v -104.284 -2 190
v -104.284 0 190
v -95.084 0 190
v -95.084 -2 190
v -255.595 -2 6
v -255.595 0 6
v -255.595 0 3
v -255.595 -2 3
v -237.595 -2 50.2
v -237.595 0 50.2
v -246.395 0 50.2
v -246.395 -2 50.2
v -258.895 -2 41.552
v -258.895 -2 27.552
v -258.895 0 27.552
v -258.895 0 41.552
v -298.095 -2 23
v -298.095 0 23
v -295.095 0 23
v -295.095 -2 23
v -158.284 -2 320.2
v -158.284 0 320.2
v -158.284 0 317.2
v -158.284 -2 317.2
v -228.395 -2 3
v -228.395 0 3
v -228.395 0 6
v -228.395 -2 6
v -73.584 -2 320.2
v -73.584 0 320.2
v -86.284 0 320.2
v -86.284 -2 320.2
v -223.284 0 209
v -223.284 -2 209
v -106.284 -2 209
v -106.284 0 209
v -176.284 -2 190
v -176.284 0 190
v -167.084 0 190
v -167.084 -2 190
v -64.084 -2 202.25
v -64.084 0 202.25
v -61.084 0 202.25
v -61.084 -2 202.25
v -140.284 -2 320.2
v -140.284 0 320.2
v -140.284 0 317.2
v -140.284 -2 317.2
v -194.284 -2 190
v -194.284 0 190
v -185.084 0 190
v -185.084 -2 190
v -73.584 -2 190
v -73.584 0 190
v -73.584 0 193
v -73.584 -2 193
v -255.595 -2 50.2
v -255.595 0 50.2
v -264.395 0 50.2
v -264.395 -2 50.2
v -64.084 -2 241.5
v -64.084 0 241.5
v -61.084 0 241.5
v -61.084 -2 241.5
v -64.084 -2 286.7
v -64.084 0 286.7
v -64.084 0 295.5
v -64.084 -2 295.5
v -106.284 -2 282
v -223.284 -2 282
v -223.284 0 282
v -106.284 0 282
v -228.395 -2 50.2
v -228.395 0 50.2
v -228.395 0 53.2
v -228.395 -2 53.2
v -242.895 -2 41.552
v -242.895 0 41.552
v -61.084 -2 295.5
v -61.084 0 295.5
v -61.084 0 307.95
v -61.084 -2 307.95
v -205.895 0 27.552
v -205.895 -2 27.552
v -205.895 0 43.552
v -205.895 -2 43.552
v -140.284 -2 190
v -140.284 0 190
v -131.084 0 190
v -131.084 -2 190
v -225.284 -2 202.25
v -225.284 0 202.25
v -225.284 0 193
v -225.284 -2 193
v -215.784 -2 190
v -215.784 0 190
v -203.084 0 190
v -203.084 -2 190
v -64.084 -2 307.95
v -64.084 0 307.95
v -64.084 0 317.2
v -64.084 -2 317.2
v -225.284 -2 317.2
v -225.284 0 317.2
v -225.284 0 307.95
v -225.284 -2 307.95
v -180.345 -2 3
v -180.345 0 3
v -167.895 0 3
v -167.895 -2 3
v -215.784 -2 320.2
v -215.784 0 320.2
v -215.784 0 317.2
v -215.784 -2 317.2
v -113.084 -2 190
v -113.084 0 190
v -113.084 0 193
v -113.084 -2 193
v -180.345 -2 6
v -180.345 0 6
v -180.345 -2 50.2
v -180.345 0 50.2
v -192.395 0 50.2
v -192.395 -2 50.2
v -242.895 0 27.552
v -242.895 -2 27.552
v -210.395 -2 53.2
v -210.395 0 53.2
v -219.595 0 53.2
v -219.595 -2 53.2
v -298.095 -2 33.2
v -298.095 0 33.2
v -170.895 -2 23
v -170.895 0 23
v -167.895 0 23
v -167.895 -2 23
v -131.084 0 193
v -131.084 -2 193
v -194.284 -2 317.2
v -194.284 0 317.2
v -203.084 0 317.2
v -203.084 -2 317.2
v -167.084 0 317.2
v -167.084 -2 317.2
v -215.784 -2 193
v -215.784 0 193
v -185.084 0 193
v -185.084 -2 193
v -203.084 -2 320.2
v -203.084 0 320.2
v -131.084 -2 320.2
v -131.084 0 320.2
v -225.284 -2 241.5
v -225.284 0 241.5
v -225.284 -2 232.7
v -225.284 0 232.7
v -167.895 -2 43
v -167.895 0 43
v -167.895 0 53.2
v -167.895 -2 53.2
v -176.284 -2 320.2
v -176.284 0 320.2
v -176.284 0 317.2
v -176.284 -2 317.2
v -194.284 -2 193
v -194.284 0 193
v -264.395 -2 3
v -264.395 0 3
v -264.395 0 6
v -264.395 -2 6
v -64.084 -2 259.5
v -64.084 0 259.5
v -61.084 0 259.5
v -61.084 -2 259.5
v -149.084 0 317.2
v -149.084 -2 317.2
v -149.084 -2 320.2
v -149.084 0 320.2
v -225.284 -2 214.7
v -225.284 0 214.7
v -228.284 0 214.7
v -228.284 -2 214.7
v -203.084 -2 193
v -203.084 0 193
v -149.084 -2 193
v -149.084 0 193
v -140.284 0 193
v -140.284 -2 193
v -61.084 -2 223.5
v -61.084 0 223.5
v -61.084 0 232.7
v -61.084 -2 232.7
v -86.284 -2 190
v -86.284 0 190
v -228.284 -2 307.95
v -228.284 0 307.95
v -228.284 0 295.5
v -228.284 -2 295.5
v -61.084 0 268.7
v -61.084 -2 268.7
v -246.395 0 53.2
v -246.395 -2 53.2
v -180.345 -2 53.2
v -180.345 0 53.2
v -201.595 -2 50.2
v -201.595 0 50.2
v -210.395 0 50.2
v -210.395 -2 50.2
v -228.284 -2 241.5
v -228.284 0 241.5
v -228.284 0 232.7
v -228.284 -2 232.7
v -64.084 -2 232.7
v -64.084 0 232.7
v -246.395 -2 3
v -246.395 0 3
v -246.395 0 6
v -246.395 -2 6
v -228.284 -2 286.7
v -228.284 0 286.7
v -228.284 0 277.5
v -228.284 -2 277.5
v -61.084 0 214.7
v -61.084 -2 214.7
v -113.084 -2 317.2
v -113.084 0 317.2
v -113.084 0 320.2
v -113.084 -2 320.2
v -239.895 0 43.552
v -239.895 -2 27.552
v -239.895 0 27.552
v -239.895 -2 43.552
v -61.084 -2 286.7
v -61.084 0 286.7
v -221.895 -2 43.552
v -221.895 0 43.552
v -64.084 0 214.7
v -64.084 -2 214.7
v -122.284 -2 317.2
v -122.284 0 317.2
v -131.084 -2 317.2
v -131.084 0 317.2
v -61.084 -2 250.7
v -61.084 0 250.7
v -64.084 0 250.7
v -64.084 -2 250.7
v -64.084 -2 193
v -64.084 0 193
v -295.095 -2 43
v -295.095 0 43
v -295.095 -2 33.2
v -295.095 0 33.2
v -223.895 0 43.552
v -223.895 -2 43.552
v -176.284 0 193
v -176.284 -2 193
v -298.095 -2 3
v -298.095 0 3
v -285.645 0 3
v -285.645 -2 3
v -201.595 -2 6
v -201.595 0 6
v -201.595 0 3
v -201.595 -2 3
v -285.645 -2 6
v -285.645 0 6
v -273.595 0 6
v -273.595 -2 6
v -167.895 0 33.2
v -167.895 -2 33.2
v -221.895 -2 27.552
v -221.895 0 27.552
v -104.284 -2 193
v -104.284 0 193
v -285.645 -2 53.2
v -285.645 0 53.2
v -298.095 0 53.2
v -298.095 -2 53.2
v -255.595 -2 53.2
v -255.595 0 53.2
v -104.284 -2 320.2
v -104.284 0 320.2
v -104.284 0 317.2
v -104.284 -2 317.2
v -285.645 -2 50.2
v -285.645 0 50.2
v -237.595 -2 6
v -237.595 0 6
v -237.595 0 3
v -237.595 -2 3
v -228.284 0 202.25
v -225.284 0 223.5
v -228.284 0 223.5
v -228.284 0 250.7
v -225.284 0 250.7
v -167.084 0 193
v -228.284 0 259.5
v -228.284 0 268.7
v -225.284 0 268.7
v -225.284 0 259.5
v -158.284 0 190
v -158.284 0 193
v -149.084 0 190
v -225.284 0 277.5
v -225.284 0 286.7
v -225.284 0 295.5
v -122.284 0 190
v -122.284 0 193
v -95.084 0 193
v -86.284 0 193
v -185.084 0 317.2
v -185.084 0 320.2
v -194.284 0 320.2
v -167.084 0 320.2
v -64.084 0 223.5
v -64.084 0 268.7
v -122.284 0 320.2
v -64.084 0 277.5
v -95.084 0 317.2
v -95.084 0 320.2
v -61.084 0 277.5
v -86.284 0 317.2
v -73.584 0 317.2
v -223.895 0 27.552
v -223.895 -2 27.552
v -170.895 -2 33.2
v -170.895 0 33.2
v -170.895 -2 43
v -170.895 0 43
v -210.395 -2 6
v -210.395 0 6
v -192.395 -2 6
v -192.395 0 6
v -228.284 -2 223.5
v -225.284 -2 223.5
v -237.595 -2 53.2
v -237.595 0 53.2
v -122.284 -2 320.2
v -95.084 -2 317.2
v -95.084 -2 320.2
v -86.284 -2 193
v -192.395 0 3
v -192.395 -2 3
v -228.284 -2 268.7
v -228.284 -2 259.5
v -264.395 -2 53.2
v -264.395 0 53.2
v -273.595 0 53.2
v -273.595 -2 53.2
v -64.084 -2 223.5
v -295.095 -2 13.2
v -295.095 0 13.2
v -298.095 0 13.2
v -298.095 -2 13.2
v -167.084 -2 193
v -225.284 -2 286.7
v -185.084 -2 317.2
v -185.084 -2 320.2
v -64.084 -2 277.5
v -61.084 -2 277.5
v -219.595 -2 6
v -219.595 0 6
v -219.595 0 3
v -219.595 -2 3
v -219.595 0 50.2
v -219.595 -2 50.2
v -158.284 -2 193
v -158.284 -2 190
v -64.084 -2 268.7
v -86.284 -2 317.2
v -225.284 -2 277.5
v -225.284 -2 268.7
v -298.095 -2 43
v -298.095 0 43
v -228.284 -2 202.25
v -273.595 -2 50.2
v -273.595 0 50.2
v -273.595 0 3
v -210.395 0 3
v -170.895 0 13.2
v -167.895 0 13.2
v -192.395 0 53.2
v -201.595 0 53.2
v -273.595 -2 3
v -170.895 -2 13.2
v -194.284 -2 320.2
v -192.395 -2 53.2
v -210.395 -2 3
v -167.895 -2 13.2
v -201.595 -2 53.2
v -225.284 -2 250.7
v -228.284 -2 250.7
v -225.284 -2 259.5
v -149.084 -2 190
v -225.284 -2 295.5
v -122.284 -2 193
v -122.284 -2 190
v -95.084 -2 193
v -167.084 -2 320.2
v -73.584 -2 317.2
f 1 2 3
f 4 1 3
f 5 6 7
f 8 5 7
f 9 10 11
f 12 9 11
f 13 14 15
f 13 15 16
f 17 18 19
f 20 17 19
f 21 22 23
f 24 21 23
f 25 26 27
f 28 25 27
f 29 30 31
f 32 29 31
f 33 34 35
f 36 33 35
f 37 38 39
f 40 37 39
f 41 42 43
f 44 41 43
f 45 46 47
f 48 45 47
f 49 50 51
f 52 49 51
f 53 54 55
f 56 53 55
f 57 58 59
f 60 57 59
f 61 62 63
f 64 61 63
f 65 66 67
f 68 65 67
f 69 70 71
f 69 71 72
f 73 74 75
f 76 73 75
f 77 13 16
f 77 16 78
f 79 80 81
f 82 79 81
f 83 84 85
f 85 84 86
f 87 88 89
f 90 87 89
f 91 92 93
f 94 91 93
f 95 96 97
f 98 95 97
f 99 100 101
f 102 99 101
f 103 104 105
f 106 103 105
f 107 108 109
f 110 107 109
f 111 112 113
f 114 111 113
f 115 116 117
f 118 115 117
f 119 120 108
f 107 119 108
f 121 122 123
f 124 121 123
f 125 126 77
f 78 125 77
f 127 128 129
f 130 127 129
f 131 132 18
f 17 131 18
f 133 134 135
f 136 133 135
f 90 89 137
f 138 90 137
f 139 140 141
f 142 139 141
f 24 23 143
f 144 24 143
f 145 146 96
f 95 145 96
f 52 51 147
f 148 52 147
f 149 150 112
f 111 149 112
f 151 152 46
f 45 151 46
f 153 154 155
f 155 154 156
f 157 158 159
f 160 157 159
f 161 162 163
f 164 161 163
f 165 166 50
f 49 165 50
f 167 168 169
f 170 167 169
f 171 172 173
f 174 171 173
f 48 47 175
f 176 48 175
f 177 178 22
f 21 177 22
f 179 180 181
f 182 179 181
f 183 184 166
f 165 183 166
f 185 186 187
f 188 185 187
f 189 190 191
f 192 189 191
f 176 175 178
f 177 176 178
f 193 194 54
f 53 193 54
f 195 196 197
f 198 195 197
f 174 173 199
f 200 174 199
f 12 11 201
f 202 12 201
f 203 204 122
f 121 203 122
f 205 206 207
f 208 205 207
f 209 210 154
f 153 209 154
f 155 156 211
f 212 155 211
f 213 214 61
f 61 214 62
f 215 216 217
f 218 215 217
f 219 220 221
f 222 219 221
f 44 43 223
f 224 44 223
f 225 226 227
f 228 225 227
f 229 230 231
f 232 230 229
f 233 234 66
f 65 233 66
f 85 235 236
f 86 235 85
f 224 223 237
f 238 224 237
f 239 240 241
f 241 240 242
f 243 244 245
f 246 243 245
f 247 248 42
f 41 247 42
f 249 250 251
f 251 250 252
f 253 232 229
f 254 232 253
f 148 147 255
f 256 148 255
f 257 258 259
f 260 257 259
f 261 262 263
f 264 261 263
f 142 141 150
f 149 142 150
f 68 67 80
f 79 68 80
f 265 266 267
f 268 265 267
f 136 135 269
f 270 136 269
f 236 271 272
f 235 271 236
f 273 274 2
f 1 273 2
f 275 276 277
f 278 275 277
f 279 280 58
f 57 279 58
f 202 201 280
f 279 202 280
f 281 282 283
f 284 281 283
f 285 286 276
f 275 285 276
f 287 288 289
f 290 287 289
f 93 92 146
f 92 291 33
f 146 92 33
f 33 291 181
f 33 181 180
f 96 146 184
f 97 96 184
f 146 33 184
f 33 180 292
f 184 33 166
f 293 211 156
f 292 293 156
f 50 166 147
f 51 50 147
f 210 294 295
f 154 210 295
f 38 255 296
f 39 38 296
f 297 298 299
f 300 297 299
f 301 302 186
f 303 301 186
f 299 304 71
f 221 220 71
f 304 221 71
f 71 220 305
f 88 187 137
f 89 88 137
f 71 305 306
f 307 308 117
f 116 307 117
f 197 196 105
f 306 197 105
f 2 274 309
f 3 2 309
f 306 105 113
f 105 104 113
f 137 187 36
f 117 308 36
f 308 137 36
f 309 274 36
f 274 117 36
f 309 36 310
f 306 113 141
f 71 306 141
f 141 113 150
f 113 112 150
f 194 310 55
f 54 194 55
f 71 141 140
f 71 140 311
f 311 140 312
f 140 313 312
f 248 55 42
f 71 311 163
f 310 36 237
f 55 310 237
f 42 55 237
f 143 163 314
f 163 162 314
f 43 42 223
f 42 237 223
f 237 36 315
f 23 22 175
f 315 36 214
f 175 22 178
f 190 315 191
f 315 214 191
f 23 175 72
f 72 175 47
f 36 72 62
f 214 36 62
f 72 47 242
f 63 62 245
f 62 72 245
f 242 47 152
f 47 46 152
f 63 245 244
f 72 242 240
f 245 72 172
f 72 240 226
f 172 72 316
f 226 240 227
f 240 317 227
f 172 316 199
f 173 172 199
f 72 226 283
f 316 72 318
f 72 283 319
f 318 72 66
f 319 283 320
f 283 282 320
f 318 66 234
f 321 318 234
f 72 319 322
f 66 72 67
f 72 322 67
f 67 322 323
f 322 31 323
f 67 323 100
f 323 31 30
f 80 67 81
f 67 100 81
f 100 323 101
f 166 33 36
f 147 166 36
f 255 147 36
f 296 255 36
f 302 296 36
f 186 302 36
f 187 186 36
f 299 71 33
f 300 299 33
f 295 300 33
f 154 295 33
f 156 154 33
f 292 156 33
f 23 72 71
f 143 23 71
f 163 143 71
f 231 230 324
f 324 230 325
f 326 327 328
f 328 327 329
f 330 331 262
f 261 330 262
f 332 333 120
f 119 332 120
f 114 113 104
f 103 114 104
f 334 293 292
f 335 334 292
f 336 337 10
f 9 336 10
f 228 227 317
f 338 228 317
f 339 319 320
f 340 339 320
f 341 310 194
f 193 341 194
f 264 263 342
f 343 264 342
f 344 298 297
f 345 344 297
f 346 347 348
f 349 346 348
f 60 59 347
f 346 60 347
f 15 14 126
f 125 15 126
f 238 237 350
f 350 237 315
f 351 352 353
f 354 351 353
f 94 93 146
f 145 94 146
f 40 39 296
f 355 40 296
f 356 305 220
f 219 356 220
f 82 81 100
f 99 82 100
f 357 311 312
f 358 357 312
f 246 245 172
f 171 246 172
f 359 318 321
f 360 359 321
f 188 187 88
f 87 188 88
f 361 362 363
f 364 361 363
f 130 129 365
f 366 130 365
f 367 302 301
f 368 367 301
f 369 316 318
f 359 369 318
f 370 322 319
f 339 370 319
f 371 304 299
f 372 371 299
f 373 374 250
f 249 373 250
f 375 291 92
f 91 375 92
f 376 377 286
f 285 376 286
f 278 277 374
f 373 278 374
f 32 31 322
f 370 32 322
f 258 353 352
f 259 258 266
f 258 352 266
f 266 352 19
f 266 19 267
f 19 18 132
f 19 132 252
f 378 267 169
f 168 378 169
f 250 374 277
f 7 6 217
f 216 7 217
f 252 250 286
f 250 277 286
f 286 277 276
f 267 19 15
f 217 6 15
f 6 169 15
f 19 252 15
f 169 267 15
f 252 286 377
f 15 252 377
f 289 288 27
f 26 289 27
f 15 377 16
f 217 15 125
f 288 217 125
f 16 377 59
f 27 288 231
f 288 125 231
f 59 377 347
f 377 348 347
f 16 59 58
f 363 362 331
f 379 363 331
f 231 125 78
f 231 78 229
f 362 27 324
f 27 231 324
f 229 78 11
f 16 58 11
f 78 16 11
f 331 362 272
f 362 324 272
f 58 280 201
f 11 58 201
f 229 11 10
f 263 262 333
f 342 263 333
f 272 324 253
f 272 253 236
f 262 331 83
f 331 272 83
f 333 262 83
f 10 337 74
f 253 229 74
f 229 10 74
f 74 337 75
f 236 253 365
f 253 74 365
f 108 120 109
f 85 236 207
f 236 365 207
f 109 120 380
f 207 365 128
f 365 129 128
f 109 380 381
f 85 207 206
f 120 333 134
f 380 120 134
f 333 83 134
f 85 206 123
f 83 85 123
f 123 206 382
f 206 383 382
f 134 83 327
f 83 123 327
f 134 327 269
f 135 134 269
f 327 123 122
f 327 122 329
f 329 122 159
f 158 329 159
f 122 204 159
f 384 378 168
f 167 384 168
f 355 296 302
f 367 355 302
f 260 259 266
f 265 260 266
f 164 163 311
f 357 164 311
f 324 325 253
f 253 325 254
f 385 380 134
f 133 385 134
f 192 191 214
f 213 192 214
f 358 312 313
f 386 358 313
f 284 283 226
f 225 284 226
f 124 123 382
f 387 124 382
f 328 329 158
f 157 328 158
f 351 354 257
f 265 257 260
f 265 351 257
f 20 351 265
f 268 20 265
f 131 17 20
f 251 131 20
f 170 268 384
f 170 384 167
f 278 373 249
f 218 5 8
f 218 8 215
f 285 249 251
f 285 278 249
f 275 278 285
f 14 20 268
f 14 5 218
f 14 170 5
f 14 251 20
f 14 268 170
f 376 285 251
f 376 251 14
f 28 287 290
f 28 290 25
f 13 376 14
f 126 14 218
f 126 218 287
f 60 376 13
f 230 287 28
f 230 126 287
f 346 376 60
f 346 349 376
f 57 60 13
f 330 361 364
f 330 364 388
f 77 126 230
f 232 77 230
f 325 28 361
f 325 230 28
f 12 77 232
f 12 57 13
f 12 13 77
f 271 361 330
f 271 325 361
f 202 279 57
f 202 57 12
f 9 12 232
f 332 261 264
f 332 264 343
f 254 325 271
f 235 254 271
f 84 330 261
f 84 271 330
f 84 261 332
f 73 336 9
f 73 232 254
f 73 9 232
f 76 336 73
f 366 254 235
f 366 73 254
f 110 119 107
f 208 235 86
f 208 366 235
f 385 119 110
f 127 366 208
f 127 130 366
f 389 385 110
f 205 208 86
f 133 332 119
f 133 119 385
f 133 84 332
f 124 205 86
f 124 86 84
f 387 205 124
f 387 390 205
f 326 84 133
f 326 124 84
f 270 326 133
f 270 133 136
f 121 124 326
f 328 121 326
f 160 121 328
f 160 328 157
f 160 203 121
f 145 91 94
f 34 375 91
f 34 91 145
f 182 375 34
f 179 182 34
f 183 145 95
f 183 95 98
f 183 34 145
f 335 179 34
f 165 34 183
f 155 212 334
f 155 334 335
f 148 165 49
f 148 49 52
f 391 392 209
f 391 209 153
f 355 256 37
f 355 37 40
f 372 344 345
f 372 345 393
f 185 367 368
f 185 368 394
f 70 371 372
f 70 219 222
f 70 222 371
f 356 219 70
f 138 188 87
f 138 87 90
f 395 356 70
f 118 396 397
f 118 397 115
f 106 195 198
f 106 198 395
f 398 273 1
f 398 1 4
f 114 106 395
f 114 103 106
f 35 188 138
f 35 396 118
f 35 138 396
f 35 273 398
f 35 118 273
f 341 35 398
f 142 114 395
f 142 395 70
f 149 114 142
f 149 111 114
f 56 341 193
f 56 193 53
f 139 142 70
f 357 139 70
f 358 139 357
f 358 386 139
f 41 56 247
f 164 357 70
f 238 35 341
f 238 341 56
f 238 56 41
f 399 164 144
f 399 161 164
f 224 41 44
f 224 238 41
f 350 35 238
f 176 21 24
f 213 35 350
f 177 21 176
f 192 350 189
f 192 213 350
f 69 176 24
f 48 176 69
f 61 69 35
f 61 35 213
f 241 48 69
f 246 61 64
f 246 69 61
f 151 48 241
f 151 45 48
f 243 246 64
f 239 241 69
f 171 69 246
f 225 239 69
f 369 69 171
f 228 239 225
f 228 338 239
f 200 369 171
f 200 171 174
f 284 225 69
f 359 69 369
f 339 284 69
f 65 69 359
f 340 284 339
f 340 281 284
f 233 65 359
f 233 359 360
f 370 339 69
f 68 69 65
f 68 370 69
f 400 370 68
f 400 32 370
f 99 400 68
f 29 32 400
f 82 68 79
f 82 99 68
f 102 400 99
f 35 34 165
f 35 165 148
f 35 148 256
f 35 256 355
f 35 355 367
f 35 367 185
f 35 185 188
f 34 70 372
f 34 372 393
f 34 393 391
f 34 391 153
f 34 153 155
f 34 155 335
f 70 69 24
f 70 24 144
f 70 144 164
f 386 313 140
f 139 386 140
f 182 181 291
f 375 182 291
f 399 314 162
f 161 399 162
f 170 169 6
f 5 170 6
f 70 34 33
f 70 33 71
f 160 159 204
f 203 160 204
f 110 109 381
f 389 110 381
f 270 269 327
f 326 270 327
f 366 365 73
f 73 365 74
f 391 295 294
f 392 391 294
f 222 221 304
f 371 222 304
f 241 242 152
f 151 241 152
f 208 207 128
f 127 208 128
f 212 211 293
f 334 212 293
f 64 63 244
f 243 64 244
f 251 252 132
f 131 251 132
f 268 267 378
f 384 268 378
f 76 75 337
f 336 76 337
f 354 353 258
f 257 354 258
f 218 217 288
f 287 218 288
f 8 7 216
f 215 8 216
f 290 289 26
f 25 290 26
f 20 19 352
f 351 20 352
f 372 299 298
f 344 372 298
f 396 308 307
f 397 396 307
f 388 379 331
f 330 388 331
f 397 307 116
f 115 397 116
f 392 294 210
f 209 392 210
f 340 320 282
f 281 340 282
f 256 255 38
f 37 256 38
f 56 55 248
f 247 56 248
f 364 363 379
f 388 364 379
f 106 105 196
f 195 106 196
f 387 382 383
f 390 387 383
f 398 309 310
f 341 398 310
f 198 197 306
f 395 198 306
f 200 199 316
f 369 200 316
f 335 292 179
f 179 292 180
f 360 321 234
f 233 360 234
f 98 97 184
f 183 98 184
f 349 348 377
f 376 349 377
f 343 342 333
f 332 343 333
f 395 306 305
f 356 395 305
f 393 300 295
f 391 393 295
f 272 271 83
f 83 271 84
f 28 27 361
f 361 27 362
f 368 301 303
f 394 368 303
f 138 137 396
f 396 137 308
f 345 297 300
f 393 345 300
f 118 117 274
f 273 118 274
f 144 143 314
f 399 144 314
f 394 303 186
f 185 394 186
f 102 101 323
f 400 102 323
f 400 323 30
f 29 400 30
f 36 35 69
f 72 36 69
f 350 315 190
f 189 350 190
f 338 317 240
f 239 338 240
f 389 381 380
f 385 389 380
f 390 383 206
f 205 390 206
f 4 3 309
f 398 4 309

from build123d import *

# Parameters (mm, degrees)
F1_DEPTH = 2
F3_DEPTH = 2
F4_W     = 117
F4_H     = 73
F5_DEPTH = 3
F2_W     = 16
F2_H     = 16
F2_H_2   = 14
F6_DEPTH = 3


with BuildPart() as f1:
    # F0 (on Front) → F1 (new body)
    with BuildSketch(Plane.XZ):
        Polygon((-285.644661, 53.199995), (-298.09466, 53.199995), (-298.09466, 42.999996), (-295.09466, 42.999996), (-295.09466, 33.199996), (-298.09466, 33.199996), (-298.09466, 22.999996), (-295.09466, 22.999996), (-295.09466, 13.199996), (-298.09466, 13.199996), (-298.09466, 2.999999), (-285.644661, 2.999999), (-285.644661, 5.999998), (-273.594661, 5.999998), (-273.594661, 2.999999), (-264.394662, 2.999999), (-264.394662, 5.999998), (-255.594664, 5.999998), (-255.594664, 2.999999), (-246.394661, 2.999999), (-246.394661, 5.999998), (-237.594663, 5.999998), (-237.594663, 2.999999), (-228.394665, 2.999999), (-228.394665, 5.999998), (-219.594663, 5.999998), (-219.594663, 2.999999), (-210.394664, 2.999999), (-210.394664, 5.999998), (-201.594666, 5.999998), (-201.594666, 2.999999), (-192.394667, 2.999999), (-192.394667, 5.999998), (-180.344664, 5.999998), (-180.344664, 2.999999), (-167.894668, 2.999999), (-167.894668, 13.199996), (-170.894663, 13.199996), (-170.894663, 22.999996), (-167.894668, 22.999996), (-167.894668, 33.199996), (-170.894663, 33.199996), (-170.894663, 42.999996), (-167.894668, 42.999996), (-167.894668, 53.199995), (-180.344664, 53.199995), (-180.344664, 50.199996), (-192.394667, 50.199996), (-192.394667, 53.199995), (-201.594666, 53.199995), (-201.594666, 50.199996), (-210.394664, 50.199996), (-210.394664, 53.199995), (-219.594663, 53.199995), (-219.594663, 50.199996), (-228.394665, 50.199996), (-228.394665, 53.199995), (-237.594663, 53.199995), (-237.594663, 50.199996), (-246.394661, 50.199996), (-246.394661, 53.199995), (-255.594664, 53.199995), (-255.594664, 50.199996), (-264.394662, 50.199996), (-264.394662, 53.199995), (-273.594661, 53.199995), (-273.594661, 50.199996), (-285.644661, 50.199996), align=None)
    extrude(amount=F1_DEPTH)

    # F2 (on face) → F6 (cut)
    with BuildSketch(Plane.XZ.offset(2)):
        with Locations((-213.894663, 35.552187)):
            Rectangle(F2_W, F2_H)
        with Locations((-231.894663, 35.552187)):
            Rectangle(F2_W, F2_H)
        with Locations((-250.894663, 34.552187)):
            Rectangle(F2_W, F2_H_2)
    extrude(amount=-F6_DEPTH, mode=Mode.SUBTRACT)


with BuildPart() as f3:
    # F0 (on Front) → F3 (new body)
    with BuildSketch(Plane.XZ):
        Polygon((-225.284467, 202.250004), (-225.284467, 193.000004), (-215.784468, 193.000004), (-215.784468, 190.000004), (-203.084468, 190.000004), (-203.084468, 193.000004), (-194.284469, 193.000004), (-194.284469, 190.000004), (-185.084468, 190.000004), (-185.084468, 193.000004), (-176.28447, 193.000004), (-176.28447, 190.000004), (-167.084471, 190.000004), (-167.084471, 193.000004), (-158.284473, 193.000004), (-158.284473, 190.000004), (-149.08447, 190.000004), (-149.08447, 193.000004), (-140.284472, 193.000004), (-140.284472, 190.000004), (-131.084473, 190.000004), (-131.084473, 193.000004), (-122.284476, 193.000004), (-122.284476, 190.000004), (-113.084477, 190.000004), (-113.084477, 193.000004), (-104.284471, 193.000004), (-104.284471, 190.000004), (-95.084472, 190.000004), (-95.084472, 193.000004), (-86.284474, 193.000004), (-86.284474, 190.000004), (-73.584468, 190.000004), (-73.584468, 193.000004), (-64.08447, 193.000004), (-64.08447, 202.250004), (-61.084484, 202.250004), (-61.084484, 214.700004), (-64.08447, 214.700004), (-64.08447, 223.500001), (-61.084484, 223.500001), (-61.084484, 232.7), (-64.08447, 232.7), (-64.08447, 241.500002), (-61.084484, 241.500002), (-61.084484, 250.700001), (-64.08447, 250.700001), (-64.08447, 259.499999), (-61.084484, 259.499999), (-61.084484, 268.699998), (-64.08447, 268.699998), (-64.08447, 277.499996), (-61.084484, 277.499996), (-61.084484, 286.700003), (-64.08447, 286.700003), (-64.08447, 295.500001), (-61.084484, 295.500001), (-61.084484, 307.949996), (-64.08447, 307.949996), (-64.08447, 317.200001), (-73.584468, 317.200001), (-73.584468, 320.199996), (-86.284474, 320.199996), (-86.284474, 317.200001), (-95.084472, 317.200001), (-95.084472, 320.199996), (-104.284471, 320.199996), (-104.284471, 317.200001), (-113.084477, 317.200001), (-113.084477, 320.199996), (-122.284476, 320.199996), (-122.284476, 317.200001), (-131.084473, 317.200001), (-131.084473, 320.199996), (-140.284472, 320.199996), (-140.284472, 317.200001), (-149.08447, 317.200001), (-149.08447, 320.199996), (-158.284473, 320.199996), (-158.284473, 317.200001), (-167.084471, 317.200001), (-167.084471, 320.199996), (-176.28447, 320.199996), (-176.28447, 317.200001), (-185.084468, 317.200001), (-185.084468, 320.199996), (-194.284469, 320.199996), (-194.284469, 317.200001), (-203.084468, 317.200001), (-203.084468, 320.199996), (-215.784468, 320.199996), (-215.784468, 317.200001), (-225.284467, 317.200001), (-225.284467, 307.949996), (-228.284467, 307.949996), (-228.284467, 295.500001), (-225.284467, 295.500001), (-225.284467, 286.700003), (-228.284467, 286.700003), (-228.284467, 277.499996), (-225.284467, 277.499996), (-225.284467, 268.699998), (-228.284467, 268.699998), (-228.284467, 259.499999), (-225.284467, 259.499999), (-225.284467, 250.700001), (-228.284467, 250.700001), (-228.284467, 241.500002), (-225.284467, 241.500002), (-225.284467, 232.7), (-228.284467, 232.7), (-228.284467, 223.500001), (-225.284467, 223.500001), (-225.284467, 214.700004), (-228.284467, 214.700004), (-228.284467, 202.250004), align=None)
    extrude(amount=F3_DEPTH)

    # F4 (on face) → F5 (cut)
    with BuildSketch(Plane.XZ.offset(2)):
        with Locations((-164.784467, 245.500004)):
            Rectangle(F4_W, F4_H)
    extrude(amount=-F5_DEPTH, mode=Mode.SUBTRACT)


solid = Compound([f1.part, f3.part])
